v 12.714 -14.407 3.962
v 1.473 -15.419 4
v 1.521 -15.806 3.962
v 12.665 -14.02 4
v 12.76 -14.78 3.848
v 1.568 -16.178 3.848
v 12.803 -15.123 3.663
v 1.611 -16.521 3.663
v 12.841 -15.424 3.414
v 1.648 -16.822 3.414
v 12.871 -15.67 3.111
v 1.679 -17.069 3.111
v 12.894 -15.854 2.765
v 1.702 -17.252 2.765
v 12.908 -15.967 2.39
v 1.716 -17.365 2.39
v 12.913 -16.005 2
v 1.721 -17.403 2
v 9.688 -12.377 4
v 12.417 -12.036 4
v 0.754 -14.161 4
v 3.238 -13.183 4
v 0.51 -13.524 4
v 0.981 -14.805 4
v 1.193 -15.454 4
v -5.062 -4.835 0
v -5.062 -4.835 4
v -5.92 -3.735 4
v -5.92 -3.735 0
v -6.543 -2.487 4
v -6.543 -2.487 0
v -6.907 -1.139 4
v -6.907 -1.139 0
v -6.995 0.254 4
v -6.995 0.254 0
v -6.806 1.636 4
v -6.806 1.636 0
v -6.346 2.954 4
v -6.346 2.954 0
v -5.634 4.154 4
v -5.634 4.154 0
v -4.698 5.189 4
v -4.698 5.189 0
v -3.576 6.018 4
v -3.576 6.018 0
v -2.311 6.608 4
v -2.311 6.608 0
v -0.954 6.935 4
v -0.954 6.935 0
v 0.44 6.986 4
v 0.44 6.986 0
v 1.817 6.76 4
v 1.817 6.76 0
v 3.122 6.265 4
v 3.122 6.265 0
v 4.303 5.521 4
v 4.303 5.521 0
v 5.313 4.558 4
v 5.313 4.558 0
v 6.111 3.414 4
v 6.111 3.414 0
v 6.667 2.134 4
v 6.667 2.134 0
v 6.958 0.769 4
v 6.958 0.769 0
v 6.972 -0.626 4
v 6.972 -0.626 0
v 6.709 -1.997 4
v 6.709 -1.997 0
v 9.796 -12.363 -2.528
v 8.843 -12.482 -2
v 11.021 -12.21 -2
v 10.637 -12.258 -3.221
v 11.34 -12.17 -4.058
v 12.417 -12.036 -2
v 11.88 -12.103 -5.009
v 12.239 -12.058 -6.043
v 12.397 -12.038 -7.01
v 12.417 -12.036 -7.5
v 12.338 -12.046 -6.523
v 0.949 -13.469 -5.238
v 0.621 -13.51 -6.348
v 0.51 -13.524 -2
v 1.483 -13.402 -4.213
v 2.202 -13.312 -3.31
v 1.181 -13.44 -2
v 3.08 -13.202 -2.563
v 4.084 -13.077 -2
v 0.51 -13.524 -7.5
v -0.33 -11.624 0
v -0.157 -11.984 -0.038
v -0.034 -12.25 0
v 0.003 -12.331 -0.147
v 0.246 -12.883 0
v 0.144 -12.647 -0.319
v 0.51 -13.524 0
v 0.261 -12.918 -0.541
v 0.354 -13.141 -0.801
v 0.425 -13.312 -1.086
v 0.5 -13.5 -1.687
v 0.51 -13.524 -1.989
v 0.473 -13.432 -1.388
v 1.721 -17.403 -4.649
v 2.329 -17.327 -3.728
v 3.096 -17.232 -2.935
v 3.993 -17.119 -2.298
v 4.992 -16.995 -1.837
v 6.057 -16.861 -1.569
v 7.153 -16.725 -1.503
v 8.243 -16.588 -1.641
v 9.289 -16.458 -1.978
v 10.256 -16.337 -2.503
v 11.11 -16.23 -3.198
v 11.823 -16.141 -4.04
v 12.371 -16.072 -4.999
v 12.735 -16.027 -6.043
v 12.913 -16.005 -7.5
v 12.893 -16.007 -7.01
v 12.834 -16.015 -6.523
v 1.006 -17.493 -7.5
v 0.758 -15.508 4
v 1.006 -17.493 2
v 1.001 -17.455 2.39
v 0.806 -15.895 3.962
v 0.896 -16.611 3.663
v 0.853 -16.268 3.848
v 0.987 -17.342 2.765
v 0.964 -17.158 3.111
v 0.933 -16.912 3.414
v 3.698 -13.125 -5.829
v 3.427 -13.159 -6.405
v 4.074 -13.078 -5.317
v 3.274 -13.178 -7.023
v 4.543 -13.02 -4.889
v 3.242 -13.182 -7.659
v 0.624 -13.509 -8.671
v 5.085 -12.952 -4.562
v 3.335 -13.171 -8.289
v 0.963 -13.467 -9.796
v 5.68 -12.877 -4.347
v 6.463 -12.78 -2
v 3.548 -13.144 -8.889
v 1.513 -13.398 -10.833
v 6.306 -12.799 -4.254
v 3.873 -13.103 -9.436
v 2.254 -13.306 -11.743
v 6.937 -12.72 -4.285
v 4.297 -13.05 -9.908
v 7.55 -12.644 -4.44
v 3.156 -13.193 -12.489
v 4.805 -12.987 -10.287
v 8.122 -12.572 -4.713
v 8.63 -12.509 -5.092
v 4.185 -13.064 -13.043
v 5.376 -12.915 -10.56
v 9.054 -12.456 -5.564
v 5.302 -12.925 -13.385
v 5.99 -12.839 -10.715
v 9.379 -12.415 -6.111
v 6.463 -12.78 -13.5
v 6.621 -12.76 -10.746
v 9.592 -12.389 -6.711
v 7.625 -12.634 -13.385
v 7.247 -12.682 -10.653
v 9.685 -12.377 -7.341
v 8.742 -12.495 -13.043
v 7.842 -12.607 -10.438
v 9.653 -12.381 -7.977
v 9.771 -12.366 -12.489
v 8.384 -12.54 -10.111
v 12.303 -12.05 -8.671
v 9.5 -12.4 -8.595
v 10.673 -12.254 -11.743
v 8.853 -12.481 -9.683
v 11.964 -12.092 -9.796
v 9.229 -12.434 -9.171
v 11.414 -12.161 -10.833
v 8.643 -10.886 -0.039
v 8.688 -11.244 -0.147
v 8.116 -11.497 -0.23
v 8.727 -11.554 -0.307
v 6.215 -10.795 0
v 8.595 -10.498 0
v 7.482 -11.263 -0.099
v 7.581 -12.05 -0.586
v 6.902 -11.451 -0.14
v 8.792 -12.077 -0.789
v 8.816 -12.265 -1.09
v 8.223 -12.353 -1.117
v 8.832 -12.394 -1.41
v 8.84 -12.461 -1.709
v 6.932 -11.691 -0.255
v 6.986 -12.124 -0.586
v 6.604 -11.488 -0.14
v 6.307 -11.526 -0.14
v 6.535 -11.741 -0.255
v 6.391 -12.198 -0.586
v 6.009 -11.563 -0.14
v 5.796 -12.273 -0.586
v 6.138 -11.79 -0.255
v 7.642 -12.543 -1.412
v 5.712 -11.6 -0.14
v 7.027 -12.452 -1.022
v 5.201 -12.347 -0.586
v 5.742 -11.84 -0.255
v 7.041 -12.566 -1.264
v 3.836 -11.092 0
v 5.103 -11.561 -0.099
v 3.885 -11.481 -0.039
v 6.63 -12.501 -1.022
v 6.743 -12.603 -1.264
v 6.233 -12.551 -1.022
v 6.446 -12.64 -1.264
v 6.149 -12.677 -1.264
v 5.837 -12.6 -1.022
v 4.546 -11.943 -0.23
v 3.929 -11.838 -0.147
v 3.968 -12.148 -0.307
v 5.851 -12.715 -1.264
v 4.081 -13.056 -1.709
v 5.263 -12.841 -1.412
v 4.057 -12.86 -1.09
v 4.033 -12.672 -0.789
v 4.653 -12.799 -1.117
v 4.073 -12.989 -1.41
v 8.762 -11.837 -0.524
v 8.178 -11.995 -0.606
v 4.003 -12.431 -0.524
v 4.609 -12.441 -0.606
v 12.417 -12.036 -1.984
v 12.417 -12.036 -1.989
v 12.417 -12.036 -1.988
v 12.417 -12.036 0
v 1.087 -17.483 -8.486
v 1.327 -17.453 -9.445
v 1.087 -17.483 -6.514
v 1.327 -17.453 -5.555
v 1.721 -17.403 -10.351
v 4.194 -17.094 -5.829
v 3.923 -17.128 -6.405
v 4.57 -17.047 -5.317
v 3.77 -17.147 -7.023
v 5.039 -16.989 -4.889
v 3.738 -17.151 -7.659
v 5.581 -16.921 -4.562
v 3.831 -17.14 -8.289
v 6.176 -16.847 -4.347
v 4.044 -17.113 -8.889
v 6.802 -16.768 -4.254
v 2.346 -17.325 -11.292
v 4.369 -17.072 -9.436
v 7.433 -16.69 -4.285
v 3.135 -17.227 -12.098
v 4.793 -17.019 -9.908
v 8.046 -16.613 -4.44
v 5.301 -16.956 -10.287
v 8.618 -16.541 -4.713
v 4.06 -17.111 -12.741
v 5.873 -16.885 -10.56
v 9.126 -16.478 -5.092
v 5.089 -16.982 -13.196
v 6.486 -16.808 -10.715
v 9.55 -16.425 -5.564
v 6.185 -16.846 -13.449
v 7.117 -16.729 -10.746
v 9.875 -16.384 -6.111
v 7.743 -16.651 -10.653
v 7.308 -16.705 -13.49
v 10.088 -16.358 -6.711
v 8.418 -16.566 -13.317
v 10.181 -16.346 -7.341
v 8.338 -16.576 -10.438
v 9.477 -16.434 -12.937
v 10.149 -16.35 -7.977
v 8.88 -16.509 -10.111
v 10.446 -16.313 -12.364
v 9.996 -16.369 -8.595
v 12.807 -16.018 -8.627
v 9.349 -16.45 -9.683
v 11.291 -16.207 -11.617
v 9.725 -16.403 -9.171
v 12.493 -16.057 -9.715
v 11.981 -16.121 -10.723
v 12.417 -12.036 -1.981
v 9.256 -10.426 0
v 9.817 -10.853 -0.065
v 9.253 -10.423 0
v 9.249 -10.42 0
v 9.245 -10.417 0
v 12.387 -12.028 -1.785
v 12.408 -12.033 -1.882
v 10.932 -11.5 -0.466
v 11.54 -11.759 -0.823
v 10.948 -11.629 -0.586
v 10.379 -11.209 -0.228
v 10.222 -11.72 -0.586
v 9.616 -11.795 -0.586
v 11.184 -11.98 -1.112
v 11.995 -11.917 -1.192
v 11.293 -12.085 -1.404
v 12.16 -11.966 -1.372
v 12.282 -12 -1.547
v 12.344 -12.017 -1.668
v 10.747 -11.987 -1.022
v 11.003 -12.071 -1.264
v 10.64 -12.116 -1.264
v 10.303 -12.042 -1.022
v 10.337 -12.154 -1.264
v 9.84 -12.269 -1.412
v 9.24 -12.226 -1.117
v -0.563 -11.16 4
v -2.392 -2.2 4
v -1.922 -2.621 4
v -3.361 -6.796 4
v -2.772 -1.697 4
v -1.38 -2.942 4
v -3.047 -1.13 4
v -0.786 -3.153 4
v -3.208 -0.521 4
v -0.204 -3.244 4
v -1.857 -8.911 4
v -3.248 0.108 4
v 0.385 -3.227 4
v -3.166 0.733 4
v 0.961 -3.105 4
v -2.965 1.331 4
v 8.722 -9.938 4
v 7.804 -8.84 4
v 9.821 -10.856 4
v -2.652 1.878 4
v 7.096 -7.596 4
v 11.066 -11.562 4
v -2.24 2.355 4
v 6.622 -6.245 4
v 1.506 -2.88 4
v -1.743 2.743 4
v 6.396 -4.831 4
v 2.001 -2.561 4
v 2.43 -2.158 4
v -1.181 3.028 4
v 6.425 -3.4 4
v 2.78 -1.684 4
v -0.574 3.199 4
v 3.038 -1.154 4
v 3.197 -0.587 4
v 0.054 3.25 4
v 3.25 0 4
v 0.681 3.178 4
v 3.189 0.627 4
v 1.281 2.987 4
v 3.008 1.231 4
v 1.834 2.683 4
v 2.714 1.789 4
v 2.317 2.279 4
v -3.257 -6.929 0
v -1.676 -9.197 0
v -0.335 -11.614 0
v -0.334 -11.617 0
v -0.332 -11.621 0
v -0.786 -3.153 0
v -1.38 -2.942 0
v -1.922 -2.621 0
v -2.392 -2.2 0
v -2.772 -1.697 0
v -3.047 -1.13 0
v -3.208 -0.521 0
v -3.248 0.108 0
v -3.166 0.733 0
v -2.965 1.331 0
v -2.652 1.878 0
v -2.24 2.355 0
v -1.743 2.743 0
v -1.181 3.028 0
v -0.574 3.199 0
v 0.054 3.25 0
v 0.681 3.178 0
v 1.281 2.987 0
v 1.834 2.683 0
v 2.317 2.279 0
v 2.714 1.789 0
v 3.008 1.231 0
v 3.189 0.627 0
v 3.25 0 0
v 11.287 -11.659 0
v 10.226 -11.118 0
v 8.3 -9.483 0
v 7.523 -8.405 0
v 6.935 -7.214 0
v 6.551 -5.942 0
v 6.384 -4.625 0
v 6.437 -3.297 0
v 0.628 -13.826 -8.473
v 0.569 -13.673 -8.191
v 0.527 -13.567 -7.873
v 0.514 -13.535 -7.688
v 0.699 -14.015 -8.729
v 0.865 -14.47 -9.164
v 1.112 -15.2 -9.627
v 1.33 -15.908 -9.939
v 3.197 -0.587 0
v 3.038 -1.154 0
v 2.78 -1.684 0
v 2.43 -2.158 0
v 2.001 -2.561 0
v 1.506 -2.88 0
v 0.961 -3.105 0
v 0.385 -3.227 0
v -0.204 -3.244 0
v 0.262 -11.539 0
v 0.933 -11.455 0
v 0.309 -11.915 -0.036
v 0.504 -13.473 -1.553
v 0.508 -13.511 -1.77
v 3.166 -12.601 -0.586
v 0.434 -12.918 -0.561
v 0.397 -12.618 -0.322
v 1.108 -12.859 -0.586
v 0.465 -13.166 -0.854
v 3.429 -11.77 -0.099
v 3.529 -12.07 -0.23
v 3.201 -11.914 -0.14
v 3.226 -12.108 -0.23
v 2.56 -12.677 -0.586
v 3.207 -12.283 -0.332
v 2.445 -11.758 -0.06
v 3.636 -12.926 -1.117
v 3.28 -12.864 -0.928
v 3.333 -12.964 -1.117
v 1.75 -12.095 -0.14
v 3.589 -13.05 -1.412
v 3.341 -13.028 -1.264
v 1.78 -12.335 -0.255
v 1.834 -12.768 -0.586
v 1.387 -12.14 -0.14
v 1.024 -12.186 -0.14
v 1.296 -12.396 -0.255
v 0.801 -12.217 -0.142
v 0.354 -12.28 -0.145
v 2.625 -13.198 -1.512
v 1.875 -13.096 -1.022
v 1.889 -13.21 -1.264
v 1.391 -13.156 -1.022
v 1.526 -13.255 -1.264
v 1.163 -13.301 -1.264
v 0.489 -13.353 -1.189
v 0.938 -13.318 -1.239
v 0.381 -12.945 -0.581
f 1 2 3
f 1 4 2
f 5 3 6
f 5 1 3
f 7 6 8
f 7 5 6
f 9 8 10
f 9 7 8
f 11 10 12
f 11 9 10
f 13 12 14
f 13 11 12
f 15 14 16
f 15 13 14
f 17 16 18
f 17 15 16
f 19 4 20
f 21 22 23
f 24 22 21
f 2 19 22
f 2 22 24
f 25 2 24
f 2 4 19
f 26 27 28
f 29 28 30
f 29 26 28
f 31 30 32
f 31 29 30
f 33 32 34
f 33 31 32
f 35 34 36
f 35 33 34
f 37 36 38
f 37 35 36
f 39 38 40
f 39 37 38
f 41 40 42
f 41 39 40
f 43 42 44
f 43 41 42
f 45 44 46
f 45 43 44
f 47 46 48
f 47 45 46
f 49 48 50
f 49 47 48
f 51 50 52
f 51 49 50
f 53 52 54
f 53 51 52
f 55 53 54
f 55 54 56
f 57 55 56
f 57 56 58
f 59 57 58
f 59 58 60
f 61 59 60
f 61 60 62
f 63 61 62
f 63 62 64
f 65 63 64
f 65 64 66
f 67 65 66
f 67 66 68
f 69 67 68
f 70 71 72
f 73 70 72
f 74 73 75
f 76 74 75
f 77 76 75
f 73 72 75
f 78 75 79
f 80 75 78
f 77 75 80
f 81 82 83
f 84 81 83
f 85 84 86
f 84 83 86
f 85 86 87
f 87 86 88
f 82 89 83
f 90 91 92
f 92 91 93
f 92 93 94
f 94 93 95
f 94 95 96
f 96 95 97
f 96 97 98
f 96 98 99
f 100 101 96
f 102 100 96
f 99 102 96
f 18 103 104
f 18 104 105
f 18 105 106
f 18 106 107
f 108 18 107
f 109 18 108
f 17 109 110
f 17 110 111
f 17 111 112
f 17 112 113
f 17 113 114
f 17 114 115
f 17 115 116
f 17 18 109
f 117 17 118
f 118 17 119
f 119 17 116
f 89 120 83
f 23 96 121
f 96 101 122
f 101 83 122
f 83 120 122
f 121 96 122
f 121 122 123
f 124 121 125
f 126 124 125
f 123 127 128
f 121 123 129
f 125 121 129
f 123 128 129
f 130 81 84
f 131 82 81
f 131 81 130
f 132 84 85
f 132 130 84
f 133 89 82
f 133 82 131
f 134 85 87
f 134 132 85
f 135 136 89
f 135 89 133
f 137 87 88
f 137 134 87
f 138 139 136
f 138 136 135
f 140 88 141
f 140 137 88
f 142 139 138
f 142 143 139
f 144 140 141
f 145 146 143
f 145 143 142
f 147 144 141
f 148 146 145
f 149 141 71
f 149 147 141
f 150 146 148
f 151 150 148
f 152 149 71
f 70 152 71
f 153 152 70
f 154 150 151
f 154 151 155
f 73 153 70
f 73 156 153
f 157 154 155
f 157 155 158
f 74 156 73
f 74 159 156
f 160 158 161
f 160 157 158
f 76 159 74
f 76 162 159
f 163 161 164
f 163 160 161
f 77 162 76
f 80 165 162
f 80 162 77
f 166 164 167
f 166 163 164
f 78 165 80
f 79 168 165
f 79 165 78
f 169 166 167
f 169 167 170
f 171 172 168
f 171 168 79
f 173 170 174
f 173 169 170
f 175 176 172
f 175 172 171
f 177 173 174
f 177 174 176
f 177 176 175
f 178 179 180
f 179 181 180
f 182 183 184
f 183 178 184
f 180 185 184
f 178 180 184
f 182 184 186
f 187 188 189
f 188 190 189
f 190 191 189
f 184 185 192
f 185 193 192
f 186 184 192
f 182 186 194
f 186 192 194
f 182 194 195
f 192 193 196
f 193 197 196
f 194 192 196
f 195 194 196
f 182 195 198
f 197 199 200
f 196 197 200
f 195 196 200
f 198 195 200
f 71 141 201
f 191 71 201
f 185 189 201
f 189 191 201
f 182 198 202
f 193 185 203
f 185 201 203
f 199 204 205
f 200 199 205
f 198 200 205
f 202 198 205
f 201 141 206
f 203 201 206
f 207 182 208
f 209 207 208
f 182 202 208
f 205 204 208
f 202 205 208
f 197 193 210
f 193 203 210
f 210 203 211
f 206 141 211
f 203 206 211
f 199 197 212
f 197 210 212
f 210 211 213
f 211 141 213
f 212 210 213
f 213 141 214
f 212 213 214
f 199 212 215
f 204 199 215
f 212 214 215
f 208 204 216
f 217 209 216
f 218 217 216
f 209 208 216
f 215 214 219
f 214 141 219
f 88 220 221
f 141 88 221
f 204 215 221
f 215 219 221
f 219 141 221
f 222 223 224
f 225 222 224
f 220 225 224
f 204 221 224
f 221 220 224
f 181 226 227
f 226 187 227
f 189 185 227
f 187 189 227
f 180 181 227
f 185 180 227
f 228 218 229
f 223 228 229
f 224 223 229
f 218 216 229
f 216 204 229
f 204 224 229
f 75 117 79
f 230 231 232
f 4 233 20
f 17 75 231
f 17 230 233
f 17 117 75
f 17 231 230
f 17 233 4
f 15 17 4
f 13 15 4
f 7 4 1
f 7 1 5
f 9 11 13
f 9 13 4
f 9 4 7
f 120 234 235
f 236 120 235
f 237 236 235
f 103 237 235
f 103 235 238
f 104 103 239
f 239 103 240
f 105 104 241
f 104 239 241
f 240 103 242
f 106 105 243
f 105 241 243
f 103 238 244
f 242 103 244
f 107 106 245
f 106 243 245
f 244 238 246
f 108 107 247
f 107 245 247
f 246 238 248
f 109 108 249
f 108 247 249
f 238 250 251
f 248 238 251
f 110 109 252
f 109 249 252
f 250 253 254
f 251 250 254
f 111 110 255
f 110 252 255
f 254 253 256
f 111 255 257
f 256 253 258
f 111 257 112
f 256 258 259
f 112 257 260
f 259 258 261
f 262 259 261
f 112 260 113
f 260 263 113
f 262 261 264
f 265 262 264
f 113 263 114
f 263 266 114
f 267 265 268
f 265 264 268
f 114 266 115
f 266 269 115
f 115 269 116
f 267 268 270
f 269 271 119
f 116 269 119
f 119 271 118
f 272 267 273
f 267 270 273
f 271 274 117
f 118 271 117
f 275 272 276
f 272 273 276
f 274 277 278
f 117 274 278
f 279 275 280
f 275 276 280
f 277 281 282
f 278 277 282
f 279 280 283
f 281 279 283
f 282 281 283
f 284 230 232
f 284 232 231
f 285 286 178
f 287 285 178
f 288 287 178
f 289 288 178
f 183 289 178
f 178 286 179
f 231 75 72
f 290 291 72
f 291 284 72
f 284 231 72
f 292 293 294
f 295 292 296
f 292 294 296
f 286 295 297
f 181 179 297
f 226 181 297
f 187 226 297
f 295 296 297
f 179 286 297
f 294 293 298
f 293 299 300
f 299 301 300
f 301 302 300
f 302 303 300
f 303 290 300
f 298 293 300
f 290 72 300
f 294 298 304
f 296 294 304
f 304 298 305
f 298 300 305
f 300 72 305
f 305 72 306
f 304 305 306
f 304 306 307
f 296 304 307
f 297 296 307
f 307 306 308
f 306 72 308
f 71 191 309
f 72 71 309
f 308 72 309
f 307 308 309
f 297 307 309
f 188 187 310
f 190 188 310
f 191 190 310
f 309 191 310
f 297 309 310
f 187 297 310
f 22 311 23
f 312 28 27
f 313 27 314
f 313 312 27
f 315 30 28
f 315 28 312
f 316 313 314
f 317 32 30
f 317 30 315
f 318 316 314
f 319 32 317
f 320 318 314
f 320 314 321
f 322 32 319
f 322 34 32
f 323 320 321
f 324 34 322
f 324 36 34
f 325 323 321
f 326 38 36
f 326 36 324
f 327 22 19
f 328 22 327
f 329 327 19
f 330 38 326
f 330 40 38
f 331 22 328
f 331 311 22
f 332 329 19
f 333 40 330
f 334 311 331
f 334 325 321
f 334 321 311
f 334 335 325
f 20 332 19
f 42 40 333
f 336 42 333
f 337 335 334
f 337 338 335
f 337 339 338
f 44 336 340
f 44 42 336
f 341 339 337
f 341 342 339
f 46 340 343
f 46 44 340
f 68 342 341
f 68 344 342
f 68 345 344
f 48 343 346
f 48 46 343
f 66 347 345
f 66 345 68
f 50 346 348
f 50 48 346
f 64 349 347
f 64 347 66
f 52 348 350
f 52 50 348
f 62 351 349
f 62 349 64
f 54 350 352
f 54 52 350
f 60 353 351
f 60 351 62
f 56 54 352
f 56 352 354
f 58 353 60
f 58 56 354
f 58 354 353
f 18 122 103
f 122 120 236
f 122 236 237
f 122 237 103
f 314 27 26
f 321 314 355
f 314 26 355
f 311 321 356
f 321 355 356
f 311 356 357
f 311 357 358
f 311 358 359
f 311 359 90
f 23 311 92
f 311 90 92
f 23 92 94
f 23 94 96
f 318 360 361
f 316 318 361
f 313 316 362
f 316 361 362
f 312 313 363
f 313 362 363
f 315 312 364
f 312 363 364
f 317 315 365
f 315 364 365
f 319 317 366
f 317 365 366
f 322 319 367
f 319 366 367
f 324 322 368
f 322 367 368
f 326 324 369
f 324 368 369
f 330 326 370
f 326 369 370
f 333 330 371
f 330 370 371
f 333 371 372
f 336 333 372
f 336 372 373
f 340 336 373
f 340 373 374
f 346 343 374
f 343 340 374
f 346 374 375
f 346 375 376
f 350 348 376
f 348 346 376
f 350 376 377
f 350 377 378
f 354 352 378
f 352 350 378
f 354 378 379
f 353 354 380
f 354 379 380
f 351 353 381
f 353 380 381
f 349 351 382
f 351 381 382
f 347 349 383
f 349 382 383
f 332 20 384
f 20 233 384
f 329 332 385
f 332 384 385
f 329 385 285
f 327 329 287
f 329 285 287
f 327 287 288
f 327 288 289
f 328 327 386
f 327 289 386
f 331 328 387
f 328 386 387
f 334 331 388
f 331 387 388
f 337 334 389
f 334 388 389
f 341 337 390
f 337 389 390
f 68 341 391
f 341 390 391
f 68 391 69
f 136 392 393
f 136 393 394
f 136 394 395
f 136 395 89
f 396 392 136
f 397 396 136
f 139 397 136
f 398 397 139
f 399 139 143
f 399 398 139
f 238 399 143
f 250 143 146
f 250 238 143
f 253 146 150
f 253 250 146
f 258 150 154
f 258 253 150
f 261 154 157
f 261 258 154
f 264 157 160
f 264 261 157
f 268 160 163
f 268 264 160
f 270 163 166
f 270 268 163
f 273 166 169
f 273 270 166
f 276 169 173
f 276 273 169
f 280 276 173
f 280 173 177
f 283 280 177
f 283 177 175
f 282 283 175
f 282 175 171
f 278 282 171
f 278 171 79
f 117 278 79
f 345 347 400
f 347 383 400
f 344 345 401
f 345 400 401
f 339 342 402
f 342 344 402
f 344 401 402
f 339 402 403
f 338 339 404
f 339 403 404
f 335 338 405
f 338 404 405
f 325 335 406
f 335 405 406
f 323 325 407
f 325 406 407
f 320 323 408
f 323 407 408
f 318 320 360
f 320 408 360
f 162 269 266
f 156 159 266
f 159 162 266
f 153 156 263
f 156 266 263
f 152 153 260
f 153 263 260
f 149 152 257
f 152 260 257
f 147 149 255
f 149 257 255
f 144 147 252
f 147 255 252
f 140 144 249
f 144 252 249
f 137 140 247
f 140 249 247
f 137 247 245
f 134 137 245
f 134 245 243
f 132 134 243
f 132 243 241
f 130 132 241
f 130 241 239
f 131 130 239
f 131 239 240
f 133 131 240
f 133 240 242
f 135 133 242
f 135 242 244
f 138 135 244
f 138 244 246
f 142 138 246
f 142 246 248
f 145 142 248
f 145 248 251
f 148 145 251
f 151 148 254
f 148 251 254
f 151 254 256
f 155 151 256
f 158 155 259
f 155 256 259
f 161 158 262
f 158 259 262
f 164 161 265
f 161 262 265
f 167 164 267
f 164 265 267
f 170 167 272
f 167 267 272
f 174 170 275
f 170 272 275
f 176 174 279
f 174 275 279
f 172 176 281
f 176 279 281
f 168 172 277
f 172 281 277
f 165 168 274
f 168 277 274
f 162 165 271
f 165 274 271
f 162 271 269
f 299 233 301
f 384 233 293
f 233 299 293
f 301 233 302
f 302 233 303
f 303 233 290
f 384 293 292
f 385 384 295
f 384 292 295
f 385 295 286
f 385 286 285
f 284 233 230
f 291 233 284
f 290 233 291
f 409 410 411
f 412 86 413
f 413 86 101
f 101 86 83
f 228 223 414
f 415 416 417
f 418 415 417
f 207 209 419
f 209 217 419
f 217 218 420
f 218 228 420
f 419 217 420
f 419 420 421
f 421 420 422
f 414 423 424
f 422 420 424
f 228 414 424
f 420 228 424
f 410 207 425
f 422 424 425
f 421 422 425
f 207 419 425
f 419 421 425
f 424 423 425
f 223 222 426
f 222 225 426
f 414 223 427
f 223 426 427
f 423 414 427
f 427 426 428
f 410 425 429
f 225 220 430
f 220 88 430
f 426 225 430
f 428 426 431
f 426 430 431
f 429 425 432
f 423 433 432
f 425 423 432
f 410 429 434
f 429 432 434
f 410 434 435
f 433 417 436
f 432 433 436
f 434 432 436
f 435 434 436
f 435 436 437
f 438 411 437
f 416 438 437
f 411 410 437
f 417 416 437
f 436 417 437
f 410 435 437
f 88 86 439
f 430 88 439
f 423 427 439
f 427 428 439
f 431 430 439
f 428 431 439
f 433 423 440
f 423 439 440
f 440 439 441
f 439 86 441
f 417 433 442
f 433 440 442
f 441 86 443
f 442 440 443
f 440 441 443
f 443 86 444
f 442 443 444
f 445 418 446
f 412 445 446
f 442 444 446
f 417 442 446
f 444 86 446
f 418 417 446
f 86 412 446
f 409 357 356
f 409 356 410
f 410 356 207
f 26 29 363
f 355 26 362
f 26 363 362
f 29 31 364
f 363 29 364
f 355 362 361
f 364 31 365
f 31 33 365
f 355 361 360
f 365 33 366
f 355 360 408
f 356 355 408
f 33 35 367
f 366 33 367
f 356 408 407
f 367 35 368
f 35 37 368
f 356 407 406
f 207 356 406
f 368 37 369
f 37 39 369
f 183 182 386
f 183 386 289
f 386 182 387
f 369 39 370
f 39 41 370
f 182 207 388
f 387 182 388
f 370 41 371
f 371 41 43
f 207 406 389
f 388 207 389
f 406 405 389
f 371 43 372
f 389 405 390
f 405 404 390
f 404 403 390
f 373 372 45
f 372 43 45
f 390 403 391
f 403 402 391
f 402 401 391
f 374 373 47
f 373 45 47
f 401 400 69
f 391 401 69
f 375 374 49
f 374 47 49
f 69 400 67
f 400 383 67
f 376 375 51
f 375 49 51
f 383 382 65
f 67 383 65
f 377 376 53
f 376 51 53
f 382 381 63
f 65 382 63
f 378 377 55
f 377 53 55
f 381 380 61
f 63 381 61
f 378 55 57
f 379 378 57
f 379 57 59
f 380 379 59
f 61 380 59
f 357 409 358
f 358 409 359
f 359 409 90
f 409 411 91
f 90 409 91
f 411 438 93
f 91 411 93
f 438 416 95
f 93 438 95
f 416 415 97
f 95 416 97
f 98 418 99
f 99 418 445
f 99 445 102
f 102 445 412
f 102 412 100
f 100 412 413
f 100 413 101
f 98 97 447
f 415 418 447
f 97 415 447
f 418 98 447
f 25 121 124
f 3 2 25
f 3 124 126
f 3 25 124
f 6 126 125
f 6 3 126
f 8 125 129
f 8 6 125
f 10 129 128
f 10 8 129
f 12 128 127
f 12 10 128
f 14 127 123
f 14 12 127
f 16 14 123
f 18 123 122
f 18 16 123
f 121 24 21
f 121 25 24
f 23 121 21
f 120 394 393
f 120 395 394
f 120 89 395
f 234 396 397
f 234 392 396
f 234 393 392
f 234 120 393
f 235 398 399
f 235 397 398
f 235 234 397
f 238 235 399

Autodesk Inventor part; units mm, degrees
ref_plane "YZ Plane" through (0, 0, 0) normal (1, 0, 0) x (0, 1, 0)
sketch "Base" plane through (0, 0, 0) normal (0, 0, 1) x (1, 0, 0)
  circle A0 centre (0, 0) radius 3.25
  circle A1 centre (0, 0) radius 7
  dimension "d0" = 6.5
  dimension "d1" = 14
extrude "BaseFeature" add sketch "Base" along normal blind 4
ref_plane "LinkPlane" through (14.2753, -15.8345, 0) normal (-0.124003, 0.9922818, 0) x (0.9625852, 0.1202919, 0.2428158)
sketch "LinkEnd" plane through (14.2753, -15.8345, 0) normal (-0.124003, 0.9922818, 0) x (0.9625852, 0.1202919, 0.2428158)
  line L0 (-6.4275, 8.6997) -> (-5.2135, 3.8493) construction
  line L1 (-8.3662, 3.0601) -> (-9.5803, 7.9105) construction
  line L2 (-8.3662, 3.0601) -> (-5.2135, 3.8493) construction
  circle A0 centre (-8.9732, 5.4853) radius 3.25
  circle A1 centre (-8.9732, 5.4853) radius 6
  dimension "d21" = 5
  dimension "d23" = 3.25
  dimension "d24" = 5
  dimension "d25" = 6.5
  dimension "d26" = 12
extrude "LinkEndFeature" add sketch "LinkEnd" along normal blind 4
ref_plane "LowerMountPlane" through (0, 0, 0) normal (0, 0, -1) x (-1, 0, 0)
sketch "LowerMount" plane through (0, 0, 0) normal (0, 0, -1) x (-1, 0, 0)
  line L0 (-9.6884, -12.3766) -> (-3.2385, -13.1827) projected
  line L1 (-0.5098, -13.5237) -> (-12.4171, -12.0356) projected
  circle A0 centre (0, 0) radius 7 projected
  arc A1 (5.0617, -4.8352) -> (-0.5098, -13.5237) centre (24.5854, -23.4853) ccw
  arc A2 (-12.4171, -12.0356) -> (-6.7091, -1.997) centre (-14.3766, -4.2793) ccw
  arc A3 (-6.7091, -1.997) -> (5.0617, -4.8352) centre (0, 0) ccw
  dimension "d27" = 8
  dimension "d28" = 27
extrude "LowerMountFeature" add sketch "LowerMount" against normal up to surface (4 mm away) contours L1 A2 A0 A1 L0
sketch "Link" plane through (6.9595, -16.7488, -7.5) normal (0.124003, -0.9922818, 0) x (0.9922818, 0.124003, 0)
  line L0 (6, 11.5) -> (-6, 11.5) projected
  line L1 (-6, 7.5) -> (-6, 11.5) projected
  line L2 (6, 7.5) -> (-6, 7.5) projected
  line L3 (6, 7.5) -> (6, 11.5) projected
  circle A0 centre (0, 0) radius 6 projected
  line L4 (6, 7.5) -> (6, 0)
  line L5 (-6, 0) -> (-6, 7.5)
extrude "LinkFeature" add sketch "Link" against normal up to surface (4 mm away) contours L3 L2 L1 L0 | L4 A0 L5 L2
fillet "LinkFilletsFeature" radius 2 2 edges at (6.4635, -12.7797, 0) (6.9595, -16.7488, 4)
properties part number "ElbowConnectorUnderlinkLeft"
